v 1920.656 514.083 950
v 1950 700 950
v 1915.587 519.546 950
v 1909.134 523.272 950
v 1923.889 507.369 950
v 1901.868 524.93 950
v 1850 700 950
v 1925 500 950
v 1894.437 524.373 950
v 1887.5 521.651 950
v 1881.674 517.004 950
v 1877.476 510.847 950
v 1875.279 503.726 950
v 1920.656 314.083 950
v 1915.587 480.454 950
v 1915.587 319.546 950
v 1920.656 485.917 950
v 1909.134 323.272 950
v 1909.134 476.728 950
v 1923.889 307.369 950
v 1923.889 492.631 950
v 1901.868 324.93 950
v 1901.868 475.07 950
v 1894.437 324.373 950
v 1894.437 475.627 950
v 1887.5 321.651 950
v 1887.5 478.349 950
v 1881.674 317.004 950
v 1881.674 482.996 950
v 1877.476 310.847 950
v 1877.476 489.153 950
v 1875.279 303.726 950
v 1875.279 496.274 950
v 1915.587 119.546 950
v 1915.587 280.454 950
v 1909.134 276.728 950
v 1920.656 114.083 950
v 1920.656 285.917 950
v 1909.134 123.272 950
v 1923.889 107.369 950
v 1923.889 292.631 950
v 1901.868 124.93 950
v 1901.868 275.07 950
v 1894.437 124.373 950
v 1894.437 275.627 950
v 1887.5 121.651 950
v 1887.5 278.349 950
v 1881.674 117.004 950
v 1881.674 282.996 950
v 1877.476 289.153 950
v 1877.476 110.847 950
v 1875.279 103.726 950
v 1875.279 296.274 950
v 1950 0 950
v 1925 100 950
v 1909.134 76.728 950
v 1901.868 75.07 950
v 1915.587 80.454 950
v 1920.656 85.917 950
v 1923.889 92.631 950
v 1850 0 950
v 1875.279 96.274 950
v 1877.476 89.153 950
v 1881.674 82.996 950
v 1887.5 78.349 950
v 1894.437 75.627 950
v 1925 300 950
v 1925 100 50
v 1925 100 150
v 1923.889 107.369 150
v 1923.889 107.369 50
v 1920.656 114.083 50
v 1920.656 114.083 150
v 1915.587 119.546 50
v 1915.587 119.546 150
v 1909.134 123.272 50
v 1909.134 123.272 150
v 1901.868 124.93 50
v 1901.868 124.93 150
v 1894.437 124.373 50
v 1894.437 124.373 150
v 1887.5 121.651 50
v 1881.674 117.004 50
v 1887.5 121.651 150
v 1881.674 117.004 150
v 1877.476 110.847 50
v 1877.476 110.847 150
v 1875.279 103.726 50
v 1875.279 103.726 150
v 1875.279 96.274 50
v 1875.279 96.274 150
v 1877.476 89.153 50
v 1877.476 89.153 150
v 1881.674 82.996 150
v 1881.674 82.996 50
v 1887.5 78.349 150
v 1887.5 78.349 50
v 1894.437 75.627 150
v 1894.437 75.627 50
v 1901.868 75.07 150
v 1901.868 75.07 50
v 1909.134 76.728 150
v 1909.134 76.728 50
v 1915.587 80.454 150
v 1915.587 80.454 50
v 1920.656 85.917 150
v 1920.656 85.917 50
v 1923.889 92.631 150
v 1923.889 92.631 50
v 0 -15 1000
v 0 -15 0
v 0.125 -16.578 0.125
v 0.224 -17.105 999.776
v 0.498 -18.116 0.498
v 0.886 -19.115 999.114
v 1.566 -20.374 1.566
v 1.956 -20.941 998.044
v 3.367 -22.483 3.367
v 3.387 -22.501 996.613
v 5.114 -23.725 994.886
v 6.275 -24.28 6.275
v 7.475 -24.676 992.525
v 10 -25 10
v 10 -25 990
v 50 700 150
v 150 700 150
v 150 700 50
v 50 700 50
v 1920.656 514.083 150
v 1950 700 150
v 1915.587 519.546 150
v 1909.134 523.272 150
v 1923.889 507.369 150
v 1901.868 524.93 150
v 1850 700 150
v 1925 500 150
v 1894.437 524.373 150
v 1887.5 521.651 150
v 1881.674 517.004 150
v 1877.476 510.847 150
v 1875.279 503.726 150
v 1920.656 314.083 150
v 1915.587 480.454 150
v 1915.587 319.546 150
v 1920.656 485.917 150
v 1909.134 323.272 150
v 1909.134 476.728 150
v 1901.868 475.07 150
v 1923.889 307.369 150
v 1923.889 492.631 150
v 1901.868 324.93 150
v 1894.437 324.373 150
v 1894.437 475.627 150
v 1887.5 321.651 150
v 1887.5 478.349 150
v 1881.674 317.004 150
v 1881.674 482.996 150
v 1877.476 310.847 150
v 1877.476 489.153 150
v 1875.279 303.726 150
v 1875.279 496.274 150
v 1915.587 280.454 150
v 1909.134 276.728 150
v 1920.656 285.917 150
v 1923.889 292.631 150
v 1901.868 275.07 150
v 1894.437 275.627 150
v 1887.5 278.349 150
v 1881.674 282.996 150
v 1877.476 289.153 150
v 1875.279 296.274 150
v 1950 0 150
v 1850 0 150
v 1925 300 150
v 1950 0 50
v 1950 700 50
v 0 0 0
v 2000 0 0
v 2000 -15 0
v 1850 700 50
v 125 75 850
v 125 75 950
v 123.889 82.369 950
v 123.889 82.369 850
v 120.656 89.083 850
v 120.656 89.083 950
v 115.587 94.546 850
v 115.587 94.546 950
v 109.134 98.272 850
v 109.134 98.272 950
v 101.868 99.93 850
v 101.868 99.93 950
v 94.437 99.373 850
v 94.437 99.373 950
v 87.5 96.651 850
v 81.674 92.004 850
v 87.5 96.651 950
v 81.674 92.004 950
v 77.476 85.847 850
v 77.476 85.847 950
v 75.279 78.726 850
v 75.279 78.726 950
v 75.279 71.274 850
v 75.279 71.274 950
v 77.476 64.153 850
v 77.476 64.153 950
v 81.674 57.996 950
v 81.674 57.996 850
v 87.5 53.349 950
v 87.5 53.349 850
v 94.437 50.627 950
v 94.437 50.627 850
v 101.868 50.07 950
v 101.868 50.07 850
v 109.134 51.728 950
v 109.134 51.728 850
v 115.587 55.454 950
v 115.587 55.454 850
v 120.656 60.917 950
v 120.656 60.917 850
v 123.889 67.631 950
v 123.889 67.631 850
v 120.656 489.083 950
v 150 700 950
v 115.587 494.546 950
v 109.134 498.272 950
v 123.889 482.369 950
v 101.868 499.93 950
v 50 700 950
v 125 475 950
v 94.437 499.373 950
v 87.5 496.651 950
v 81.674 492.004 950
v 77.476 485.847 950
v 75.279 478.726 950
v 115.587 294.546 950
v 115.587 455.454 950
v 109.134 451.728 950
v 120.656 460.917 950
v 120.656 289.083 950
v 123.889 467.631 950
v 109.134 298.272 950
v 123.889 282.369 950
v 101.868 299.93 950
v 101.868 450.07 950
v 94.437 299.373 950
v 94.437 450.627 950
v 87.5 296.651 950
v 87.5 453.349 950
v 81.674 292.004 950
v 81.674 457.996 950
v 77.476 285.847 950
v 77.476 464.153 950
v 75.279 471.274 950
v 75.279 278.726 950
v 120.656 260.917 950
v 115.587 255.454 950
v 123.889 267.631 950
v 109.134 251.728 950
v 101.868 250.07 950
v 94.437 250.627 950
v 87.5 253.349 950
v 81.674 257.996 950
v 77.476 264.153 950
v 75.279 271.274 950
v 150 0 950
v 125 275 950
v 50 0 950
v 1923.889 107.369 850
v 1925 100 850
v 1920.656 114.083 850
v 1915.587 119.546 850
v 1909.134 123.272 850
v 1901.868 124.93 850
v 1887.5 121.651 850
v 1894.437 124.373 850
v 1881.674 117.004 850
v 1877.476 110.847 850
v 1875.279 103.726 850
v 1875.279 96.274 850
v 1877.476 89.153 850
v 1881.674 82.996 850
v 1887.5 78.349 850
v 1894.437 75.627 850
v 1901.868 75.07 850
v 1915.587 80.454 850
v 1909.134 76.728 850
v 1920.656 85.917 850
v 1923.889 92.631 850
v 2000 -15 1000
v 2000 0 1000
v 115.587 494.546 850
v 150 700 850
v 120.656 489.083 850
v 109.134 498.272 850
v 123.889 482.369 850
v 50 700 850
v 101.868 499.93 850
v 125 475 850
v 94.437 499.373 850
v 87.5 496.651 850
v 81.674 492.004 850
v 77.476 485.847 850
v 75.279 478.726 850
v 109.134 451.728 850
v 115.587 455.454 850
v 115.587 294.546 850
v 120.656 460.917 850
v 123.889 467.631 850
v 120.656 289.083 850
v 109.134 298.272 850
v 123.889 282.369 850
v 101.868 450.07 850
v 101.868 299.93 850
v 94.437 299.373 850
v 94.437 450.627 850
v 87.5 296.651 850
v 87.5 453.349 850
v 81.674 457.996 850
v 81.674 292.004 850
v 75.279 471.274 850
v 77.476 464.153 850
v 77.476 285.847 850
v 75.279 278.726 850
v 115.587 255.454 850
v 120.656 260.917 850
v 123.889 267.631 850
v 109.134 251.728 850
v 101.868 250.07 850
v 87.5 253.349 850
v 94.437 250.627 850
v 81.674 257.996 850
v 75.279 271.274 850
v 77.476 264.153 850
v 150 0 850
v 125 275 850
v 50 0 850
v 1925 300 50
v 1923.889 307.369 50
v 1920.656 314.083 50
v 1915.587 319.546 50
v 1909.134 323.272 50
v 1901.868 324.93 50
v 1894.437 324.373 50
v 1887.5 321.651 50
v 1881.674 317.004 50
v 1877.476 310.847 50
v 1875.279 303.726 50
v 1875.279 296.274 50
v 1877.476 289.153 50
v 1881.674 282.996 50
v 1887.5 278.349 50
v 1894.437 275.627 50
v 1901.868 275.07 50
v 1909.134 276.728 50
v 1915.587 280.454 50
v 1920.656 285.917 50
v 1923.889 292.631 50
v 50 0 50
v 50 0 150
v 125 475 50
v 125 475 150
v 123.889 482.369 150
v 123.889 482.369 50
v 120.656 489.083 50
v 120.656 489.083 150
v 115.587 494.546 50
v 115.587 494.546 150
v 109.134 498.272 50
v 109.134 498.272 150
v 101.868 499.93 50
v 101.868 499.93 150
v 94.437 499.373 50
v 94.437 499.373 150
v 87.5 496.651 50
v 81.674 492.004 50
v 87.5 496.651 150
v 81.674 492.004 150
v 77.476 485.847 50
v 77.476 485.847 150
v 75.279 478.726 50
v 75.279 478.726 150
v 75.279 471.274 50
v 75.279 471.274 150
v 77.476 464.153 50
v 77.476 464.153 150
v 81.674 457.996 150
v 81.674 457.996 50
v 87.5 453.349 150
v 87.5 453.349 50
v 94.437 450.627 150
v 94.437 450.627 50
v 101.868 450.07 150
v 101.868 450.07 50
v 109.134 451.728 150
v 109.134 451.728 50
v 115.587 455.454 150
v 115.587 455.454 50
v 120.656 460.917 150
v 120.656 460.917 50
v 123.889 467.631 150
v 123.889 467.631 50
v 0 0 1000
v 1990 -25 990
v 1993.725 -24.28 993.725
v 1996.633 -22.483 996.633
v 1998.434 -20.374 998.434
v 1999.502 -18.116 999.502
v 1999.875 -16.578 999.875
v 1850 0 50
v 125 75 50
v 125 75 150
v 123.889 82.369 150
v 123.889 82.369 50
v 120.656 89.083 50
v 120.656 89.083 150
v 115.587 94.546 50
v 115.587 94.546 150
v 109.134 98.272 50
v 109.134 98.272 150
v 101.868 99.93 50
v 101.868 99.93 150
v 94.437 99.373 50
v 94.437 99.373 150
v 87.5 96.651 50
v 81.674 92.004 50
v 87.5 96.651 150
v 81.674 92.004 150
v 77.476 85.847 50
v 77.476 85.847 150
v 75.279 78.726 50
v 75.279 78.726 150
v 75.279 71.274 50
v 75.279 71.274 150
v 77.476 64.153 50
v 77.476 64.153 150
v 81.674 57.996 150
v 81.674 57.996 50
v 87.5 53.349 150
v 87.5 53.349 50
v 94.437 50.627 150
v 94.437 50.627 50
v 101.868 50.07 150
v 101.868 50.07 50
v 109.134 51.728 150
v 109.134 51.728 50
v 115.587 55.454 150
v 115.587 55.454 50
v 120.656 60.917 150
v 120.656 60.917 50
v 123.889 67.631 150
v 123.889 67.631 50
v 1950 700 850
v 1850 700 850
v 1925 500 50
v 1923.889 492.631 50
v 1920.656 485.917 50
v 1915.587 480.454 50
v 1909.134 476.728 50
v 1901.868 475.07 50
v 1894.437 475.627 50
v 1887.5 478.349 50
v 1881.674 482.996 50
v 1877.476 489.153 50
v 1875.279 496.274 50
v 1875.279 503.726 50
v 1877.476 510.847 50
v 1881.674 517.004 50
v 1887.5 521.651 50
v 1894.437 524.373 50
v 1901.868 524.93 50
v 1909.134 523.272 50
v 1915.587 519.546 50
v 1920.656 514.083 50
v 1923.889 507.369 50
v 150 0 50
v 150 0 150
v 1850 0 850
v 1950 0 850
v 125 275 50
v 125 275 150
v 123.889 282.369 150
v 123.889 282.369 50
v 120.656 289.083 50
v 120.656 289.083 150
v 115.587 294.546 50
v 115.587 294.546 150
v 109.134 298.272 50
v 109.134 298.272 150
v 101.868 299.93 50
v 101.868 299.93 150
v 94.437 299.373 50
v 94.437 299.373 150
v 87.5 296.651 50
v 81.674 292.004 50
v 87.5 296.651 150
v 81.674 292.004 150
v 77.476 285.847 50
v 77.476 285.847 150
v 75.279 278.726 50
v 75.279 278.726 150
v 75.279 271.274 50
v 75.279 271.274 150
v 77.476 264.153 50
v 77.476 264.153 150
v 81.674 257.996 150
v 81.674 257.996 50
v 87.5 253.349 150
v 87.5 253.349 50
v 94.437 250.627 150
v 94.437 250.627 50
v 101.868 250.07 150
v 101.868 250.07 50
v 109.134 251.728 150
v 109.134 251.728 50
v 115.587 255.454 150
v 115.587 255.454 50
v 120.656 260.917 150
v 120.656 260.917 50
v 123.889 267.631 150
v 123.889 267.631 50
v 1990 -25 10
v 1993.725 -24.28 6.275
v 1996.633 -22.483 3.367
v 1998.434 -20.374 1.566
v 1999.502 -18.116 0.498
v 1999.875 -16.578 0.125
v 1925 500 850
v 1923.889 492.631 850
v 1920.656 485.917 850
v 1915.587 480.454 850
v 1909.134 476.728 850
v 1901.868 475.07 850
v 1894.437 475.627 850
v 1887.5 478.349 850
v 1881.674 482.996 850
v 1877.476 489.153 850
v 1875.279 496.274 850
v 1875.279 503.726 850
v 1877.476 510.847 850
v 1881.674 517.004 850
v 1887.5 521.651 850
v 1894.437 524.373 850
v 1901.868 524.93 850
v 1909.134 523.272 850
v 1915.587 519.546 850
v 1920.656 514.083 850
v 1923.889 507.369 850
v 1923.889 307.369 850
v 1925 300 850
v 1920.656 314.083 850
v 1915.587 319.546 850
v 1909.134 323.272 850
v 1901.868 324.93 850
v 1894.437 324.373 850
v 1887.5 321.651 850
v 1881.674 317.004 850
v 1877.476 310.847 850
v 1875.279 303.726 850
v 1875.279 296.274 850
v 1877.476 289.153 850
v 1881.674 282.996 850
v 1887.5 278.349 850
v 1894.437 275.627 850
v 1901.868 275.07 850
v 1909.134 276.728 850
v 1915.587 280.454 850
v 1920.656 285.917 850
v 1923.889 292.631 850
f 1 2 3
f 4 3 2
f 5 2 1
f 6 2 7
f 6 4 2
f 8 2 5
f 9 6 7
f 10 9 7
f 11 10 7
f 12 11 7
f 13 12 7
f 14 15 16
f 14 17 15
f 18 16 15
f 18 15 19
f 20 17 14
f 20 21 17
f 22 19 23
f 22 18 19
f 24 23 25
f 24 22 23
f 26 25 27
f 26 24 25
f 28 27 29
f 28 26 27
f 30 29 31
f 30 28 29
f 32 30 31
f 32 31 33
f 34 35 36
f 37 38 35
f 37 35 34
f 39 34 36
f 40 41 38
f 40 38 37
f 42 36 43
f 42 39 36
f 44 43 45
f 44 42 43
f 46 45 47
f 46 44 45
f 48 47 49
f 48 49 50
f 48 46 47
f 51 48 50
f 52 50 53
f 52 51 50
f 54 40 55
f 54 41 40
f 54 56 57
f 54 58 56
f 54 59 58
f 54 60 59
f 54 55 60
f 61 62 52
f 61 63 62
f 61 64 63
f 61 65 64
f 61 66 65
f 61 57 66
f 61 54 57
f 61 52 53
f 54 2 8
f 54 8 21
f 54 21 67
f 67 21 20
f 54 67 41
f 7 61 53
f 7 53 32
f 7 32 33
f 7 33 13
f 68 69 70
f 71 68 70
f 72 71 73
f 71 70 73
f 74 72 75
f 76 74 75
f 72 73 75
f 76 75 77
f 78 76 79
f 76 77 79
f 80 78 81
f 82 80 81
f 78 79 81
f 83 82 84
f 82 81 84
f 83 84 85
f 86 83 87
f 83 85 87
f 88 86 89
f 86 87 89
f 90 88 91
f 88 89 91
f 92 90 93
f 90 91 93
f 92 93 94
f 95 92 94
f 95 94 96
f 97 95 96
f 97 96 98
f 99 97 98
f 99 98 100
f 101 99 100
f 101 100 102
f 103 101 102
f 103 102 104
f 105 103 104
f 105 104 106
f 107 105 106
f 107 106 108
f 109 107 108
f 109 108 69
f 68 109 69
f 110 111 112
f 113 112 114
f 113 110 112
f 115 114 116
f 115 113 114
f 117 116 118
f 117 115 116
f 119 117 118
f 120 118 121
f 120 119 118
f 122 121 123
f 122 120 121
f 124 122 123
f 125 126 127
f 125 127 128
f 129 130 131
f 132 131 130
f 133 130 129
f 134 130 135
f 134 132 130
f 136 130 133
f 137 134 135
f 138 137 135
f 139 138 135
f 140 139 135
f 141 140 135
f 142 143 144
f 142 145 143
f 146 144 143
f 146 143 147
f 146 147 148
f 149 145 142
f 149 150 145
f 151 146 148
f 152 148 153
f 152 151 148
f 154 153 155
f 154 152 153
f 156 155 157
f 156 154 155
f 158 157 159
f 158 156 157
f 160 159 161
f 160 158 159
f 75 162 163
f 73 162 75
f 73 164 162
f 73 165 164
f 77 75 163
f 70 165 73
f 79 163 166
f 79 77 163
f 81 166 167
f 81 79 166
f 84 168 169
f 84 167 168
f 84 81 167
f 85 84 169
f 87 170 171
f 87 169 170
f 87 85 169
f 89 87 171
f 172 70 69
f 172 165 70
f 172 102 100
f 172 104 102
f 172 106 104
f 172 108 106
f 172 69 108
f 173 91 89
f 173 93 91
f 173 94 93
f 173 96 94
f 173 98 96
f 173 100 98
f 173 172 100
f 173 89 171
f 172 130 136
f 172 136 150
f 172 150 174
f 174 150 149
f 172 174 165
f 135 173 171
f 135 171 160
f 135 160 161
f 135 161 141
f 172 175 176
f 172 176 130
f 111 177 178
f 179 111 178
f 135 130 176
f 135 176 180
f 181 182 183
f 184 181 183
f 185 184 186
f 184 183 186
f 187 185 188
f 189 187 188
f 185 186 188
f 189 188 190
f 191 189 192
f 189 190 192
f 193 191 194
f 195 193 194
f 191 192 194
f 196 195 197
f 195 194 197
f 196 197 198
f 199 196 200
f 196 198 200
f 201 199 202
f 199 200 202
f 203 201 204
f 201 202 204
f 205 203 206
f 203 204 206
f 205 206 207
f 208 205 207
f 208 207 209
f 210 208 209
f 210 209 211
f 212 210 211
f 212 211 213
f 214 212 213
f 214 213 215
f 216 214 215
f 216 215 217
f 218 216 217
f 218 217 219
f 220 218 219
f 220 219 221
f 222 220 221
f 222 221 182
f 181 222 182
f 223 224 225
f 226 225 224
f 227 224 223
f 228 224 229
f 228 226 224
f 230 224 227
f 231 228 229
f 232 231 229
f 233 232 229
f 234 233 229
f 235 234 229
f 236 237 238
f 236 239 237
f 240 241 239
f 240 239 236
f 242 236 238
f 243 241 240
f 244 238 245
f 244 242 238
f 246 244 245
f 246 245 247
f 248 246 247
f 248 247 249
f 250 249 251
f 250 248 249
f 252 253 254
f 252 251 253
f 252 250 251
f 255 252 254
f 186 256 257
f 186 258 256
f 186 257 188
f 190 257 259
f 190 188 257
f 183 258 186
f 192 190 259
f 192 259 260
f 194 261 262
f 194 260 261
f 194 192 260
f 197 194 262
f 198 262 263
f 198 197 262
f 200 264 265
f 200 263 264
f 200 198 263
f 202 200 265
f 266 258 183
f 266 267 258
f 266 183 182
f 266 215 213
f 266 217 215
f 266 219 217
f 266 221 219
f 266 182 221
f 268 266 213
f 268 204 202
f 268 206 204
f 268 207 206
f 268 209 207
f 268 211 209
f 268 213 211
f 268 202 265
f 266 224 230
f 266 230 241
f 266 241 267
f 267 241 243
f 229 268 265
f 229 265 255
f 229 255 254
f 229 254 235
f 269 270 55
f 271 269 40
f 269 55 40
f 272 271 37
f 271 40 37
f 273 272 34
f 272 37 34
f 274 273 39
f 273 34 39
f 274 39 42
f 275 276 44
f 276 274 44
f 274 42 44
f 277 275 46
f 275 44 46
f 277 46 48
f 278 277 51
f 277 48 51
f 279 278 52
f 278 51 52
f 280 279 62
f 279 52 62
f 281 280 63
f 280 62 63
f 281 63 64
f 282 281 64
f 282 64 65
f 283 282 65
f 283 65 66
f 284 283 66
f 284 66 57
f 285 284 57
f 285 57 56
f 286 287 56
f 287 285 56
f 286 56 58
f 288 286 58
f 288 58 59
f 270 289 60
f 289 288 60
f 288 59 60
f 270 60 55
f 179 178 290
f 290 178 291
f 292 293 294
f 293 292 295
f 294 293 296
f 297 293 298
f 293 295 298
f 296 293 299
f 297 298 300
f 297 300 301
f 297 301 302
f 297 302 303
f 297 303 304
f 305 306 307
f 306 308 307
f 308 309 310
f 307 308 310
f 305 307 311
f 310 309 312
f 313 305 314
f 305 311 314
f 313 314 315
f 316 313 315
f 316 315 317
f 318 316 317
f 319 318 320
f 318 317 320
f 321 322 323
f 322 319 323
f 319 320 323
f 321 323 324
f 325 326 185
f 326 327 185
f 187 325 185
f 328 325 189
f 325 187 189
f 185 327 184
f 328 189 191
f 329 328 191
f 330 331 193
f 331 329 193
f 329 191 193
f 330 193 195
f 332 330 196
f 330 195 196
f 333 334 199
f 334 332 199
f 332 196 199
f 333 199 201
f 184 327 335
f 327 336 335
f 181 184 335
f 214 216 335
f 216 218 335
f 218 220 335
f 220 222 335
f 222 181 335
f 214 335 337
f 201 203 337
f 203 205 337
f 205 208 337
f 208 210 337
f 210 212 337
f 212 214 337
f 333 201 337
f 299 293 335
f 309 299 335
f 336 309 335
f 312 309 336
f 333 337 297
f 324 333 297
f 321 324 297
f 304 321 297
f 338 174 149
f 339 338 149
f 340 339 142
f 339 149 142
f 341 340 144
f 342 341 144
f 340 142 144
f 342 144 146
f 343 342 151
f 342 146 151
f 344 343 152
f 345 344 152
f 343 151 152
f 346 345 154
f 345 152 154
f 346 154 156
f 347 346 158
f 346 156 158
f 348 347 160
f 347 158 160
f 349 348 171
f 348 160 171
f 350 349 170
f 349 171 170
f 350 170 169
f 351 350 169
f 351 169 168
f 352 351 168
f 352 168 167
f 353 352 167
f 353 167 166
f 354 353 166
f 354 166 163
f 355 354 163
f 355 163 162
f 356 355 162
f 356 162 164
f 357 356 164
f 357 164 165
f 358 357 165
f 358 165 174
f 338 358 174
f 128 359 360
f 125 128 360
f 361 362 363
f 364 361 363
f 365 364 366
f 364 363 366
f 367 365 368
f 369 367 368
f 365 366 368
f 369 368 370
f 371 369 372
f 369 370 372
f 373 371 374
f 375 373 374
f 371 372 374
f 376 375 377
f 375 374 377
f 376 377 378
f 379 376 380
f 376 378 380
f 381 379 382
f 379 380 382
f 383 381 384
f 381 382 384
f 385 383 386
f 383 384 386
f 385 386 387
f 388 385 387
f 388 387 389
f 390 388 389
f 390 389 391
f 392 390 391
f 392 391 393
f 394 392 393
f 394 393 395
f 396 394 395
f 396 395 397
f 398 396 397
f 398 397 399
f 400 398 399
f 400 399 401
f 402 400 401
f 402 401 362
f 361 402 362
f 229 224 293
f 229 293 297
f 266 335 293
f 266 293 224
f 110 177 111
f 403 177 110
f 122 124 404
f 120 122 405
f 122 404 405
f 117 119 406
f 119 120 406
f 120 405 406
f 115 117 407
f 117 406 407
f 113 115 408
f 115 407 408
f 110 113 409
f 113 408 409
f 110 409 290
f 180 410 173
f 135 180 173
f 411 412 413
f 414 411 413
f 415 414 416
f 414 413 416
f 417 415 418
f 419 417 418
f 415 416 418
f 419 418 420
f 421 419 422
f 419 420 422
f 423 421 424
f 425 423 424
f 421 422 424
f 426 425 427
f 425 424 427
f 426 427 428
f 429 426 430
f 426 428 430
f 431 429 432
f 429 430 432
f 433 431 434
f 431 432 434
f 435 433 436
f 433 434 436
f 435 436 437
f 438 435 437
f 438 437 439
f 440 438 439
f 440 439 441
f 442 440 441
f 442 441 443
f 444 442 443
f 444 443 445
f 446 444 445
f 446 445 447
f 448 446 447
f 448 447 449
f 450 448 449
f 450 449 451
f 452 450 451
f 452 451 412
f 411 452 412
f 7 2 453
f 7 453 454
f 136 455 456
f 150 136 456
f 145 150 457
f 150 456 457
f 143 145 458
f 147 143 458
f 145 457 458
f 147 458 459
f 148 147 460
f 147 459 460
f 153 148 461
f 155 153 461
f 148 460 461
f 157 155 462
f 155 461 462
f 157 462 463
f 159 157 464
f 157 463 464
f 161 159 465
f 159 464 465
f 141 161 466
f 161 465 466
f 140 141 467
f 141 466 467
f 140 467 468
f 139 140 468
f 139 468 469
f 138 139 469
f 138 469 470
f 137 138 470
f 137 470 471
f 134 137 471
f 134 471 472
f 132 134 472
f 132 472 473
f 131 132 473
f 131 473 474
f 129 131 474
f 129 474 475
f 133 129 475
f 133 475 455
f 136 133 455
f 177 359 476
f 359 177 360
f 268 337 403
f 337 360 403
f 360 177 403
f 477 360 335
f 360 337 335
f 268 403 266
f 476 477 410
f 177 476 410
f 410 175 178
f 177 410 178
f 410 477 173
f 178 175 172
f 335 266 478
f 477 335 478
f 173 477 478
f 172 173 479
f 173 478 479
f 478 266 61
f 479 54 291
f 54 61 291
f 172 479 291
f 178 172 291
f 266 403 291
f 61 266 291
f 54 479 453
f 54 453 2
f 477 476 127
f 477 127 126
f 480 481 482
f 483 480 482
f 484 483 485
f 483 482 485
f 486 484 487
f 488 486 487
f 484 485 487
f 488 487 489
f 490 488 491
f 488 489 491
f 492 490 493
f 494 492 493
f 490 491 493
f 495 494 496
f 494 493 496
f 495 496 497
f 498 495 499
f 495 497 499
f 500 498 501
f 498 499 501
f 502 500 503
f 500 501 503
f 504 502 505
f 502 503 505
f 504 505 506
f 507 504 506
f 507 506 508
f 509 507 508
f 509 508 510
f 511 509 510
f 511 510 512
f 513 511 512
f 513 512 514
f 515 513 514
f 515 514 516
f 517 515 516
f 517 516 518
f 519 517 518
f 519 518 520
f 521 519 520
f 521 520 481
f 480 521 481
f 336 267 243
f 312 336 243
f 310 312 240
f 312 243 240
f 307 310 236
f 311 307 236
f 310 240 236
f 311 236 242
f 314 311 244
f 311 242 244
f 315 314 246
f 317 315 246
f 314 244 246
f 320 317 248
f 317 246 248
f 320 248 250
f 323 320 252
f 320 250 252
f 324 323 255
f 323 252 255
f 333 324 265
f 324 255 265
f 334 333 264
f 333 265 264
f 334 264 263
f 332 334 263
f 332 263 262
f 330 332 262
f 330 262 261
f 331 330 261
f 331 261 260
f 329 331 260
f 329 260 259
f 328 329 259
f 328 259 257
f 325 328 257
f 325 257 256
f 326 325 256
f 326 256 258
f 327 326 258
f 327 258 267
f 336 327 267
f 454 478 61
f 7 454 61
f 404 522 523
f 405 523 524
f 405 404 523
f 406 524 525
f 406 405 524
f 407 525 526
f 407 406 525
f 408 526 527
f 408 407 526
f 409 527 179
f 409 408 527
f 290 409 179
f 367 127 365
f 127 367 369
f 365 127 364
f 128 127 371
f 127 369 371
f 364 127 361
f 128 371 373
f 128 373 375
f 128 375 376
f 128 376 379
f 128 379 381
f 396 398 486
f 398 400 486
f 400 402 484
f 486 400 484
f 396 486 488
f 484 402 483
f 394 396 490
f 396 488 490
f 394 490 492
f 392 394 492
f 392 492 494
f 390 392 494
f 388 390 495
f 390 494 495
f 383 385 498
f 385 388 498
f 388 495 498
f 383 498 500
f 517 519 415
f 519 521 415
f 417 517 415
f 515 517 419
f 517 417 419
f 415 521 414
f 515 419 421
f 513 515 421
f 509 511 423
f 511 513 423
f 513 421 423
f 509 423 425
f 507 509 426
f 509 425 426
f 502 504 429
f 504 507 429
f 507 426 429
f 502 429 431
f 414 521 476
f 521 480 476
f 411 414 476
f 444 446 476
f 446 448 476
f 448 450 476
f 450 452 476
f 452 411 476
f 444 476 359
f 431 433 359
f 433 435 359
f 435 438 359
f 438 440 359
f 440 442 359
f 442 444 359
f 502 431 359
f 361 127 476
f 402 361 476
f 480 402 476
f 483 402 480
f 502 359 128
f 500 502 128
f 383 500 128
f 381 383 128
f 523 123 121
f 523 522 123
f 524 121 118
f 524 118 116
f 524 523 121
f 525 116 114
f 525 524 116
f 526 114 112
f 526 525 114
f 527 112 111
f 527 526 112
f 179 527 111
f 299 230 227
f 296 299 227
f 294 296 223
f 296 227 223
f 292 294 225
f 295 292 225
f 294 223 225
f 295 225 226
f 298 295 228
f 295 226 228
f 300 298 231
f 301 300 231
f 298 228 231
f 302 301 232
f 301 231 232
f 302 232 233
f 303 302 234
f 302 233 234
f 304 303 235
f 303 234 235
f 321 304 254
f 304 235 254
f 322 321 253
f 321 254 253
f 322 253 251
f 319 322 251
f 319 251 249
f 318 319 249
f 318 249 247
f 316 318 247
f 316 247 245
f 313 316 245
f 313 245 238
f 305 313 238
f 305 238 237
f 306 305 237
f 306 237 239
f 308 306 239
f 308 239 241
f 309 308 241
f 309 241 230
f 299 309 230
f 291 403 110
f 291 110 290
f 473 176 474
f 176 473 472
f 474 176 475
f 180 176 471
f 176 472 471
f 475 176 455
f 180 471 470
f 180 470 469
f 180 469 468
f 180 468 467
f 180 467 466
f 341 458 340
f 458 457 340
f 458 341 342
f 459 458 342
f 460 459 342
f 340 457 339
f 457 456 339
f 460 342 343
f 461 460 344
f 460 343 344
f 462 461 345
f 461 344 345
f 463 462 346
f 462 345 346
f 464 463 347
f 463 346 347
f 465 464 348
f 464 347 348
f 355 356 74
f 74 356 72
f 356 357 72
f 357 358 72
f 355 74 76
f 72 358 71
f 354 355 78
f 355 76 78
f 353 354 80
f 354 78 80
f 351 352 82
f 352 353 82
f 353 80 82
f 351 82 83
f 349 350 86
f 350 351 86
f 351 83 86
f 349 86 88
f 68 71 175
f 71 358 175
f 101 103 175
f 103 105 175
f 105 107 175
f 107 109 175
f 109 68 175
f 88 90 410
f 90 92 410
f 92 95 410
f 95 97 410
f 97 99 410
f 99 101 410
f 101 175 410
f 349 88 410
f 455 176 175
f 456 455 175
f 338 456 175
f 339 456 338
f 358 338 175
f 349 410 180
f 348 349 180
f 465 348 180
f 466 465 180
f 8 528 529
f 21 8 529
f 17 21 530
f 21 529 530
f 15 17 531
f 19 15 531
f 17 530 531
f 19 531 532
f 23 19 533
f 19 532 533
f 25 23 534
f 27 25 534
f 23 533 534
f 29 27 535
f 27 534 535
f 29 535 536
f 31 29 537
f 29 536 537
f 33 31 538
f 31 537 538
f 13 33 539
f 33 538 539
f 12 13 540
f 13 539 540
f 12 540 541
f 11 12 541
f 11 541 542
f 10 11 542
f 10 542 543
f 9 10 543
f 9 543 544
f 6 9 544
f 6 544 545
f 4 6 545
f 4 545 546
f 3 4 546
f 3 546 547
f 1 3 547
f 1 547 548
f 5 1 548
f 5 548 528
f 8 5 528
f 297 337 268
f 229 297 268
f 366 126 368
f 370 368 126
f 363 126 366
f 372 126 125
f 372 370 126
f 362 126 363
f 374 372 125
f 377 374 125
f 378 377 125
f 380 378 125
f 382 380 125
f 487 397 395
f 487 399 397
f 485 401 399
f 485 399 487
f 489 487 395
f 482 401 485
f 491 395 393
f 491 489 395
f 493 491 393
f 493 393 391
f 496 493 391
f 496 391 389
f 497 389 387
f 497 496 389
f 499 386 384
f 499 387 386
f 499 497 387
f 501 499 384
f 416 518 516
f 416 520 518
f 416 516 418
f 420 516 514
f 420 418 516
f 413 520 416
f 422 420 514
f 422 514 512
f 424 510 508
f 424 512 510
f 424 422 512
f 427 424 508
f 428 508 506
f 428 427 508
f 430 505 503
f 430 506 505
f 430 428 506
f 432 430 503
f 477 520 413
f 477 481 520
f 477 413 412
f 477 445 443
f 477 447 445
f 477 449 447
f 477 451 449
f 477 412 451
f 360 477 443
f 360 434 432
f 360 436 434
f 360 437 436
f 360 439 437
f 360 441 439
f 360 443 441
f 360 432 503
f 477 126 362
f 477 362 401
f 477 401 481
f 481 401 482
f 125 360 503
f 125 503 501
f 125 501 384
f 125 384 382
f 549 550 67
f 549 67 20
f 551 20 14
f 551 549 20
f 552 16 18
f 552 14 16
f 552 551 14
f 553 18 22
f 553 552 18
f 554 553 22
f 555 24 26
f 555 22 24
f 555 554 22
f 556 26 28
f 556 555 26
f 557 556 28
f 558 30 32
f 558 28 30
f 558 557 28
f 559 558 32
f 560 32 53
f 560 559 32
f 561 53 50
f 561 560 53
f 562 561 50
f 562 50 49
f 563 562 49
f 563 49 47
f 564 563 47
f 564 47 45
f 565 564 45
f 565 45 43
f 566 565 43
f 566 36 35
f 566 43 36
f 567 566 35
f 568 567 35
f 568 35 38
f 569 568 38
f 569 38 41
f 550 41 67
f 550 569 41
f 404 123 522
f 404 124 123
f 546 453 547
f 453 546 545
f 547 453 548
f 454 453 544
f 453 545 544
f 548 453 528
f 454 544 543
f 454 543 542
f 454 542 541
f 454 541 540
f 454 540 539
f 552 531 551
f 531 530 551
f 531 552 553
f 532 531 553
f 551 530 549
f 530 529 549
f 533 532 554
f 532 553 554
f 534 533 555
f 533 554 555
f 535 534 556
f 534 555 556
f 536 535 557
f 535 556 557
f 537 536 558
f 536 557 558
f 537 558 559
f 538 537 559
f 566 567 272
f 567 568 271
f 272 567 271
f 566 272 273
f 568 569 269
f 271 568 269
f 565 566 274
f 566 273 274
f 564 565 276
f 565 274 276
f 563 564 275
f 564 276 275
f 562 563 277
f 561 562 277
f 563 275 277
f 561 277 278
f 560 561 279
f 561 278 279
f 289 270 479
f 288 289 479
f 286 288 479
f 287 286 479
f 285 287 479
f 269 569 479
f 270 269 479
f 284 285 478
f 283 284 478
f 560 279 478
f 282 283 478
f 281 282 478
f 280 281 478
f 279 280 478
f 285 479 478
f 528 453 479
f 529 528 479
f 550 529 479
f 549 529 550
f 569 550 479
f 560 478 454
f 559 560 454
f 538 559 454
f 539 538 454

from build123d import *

# Parameters (mm, degrees)
F0_W      = 2000
F0_H      = 1000
F1_DEPTH  = 25
F2_W      = 100
F2_H      = 100
F3_DEPTH  = 700
F4_R      = 25
F5_DEPTH  = 2819
F6_R      = 25
F7_DEPTH  = 2080
F8_R      = 25
F9_DEPTH  = 773
F10_R     = 25
F11_DEPTH = 1331
F12_R     = 25
F13_DEPTH = 1200
F14_R     = 25
F15_DEPTH = 1300
F16_DEPTH = 338
F17_R     = 25
F18_DEPTH = 1300
F19_R     = 10


with BuildPart() as f1:
    # F0 (on Front) → F1 (new body)
    with BuildSketch(Plane.XZ):
        with Locations((1000, 500)):
            Rectangle(F0_W, F0_H)
    extrude(amount=F1_DEPTH)

    # F2 (on face) → F3 (join)
    with BuildSketch(Plane(origin=(0, 0, 0), x_dir=(-1, 0, 0), z_dir=(0, 1, 0))):
        with Locations((-1900, 100)):
            Rectangle(F2_W, F2_H)
        with Locations((-100, 100)):
            Rectangle(F2_W, F2_H)
        with Locations((-1900, 900)):
            Rectangle(F2_W, F2_H)
        with Locations((-100, 900)):
            Rectangle(F2_W, F2_H)
    extrude(amount=F3_DEPTH)

    # F4 (on face) → F5 (cut)
    with BuildSketch(Plane(origin=(0, 0, 50), x_dir=(1, 0, 0), z_dir=(0, 0, -1))):
        with Locations((1900, -500)):
            Circle(F4_R)
    extrude(amount=-F5_DEPTH, mode=Mode.SUBTRACT)

    # F6 (on face) → F7 (cut)
    with BuildSketch(Plane.XY.offset(150)):
        with Locations((1900, 300)):
            Circle(F6_R)
    extrude(amount=F7_DEPTH, mode=Mode.SUBTRACT)

    # F8 (on face) → F9 (cut)
    with BuildSketch(Plane.XY.offset(150)):
        with Locations((1900, 100)):
            Circle(F8_R)
    extrude(amount=F9_DEPTH, mode=Mode.SUBTRACT)

    # F10 (on face) → F11 (cut)
    with BuildSketch(Plane.XY.offset(950)):
        with Locations((100, 475)):
            Circle(F10_R)
    extrude(amount=-F11_DEPTH, mode=Mode.SUBTRACT)

    # F12 (on face) → F13 (cut)
    with BuildSketch(Plane.XY.offset(950)):
        with Locations((100, 275)):
            Circle(F12_R)
    extrude(amount=-F13_DEPTH, mode=Mode.SUBTRACT)

    # F14 (on face) → F15 (cut)
    with BuildSketch(Plane.XY.offset(950)):
        with Locations((100, 75)):
            Circle(F14_R)
    extrude(amount=-F15_DEPTH, mode=Mode.SUBTRACT)

    # F6 (on face) → F16 (cut)
    with BuildSketch(Plane.XY.offset(150)):
        with Locations((1900, 300)):
            Circle(F6_R)
    extrude(amount=-F16_DEPTH, mode=Mode.SUBTRACT)

    # F17 (on face) → F18 (cut)
    with BuildSketch(Plane.XY.offset(950)):
        with Locations((1900, 100)):
            Circle(F17_R)
    extrude(amount=-F18_DEPTH, mode=Mode.SUBTRACT)

    # F19
    f19_edges = [f1.edges().sort_by_distance(p)[0] for p in [
        (1000, -25, 0),
        (0, -25, 500),
        (1000, -25, 1000),
        (2000, -25, 500),
    ]]
    fillet(f19_edges, radius=F19_R)


solid = f1.part
